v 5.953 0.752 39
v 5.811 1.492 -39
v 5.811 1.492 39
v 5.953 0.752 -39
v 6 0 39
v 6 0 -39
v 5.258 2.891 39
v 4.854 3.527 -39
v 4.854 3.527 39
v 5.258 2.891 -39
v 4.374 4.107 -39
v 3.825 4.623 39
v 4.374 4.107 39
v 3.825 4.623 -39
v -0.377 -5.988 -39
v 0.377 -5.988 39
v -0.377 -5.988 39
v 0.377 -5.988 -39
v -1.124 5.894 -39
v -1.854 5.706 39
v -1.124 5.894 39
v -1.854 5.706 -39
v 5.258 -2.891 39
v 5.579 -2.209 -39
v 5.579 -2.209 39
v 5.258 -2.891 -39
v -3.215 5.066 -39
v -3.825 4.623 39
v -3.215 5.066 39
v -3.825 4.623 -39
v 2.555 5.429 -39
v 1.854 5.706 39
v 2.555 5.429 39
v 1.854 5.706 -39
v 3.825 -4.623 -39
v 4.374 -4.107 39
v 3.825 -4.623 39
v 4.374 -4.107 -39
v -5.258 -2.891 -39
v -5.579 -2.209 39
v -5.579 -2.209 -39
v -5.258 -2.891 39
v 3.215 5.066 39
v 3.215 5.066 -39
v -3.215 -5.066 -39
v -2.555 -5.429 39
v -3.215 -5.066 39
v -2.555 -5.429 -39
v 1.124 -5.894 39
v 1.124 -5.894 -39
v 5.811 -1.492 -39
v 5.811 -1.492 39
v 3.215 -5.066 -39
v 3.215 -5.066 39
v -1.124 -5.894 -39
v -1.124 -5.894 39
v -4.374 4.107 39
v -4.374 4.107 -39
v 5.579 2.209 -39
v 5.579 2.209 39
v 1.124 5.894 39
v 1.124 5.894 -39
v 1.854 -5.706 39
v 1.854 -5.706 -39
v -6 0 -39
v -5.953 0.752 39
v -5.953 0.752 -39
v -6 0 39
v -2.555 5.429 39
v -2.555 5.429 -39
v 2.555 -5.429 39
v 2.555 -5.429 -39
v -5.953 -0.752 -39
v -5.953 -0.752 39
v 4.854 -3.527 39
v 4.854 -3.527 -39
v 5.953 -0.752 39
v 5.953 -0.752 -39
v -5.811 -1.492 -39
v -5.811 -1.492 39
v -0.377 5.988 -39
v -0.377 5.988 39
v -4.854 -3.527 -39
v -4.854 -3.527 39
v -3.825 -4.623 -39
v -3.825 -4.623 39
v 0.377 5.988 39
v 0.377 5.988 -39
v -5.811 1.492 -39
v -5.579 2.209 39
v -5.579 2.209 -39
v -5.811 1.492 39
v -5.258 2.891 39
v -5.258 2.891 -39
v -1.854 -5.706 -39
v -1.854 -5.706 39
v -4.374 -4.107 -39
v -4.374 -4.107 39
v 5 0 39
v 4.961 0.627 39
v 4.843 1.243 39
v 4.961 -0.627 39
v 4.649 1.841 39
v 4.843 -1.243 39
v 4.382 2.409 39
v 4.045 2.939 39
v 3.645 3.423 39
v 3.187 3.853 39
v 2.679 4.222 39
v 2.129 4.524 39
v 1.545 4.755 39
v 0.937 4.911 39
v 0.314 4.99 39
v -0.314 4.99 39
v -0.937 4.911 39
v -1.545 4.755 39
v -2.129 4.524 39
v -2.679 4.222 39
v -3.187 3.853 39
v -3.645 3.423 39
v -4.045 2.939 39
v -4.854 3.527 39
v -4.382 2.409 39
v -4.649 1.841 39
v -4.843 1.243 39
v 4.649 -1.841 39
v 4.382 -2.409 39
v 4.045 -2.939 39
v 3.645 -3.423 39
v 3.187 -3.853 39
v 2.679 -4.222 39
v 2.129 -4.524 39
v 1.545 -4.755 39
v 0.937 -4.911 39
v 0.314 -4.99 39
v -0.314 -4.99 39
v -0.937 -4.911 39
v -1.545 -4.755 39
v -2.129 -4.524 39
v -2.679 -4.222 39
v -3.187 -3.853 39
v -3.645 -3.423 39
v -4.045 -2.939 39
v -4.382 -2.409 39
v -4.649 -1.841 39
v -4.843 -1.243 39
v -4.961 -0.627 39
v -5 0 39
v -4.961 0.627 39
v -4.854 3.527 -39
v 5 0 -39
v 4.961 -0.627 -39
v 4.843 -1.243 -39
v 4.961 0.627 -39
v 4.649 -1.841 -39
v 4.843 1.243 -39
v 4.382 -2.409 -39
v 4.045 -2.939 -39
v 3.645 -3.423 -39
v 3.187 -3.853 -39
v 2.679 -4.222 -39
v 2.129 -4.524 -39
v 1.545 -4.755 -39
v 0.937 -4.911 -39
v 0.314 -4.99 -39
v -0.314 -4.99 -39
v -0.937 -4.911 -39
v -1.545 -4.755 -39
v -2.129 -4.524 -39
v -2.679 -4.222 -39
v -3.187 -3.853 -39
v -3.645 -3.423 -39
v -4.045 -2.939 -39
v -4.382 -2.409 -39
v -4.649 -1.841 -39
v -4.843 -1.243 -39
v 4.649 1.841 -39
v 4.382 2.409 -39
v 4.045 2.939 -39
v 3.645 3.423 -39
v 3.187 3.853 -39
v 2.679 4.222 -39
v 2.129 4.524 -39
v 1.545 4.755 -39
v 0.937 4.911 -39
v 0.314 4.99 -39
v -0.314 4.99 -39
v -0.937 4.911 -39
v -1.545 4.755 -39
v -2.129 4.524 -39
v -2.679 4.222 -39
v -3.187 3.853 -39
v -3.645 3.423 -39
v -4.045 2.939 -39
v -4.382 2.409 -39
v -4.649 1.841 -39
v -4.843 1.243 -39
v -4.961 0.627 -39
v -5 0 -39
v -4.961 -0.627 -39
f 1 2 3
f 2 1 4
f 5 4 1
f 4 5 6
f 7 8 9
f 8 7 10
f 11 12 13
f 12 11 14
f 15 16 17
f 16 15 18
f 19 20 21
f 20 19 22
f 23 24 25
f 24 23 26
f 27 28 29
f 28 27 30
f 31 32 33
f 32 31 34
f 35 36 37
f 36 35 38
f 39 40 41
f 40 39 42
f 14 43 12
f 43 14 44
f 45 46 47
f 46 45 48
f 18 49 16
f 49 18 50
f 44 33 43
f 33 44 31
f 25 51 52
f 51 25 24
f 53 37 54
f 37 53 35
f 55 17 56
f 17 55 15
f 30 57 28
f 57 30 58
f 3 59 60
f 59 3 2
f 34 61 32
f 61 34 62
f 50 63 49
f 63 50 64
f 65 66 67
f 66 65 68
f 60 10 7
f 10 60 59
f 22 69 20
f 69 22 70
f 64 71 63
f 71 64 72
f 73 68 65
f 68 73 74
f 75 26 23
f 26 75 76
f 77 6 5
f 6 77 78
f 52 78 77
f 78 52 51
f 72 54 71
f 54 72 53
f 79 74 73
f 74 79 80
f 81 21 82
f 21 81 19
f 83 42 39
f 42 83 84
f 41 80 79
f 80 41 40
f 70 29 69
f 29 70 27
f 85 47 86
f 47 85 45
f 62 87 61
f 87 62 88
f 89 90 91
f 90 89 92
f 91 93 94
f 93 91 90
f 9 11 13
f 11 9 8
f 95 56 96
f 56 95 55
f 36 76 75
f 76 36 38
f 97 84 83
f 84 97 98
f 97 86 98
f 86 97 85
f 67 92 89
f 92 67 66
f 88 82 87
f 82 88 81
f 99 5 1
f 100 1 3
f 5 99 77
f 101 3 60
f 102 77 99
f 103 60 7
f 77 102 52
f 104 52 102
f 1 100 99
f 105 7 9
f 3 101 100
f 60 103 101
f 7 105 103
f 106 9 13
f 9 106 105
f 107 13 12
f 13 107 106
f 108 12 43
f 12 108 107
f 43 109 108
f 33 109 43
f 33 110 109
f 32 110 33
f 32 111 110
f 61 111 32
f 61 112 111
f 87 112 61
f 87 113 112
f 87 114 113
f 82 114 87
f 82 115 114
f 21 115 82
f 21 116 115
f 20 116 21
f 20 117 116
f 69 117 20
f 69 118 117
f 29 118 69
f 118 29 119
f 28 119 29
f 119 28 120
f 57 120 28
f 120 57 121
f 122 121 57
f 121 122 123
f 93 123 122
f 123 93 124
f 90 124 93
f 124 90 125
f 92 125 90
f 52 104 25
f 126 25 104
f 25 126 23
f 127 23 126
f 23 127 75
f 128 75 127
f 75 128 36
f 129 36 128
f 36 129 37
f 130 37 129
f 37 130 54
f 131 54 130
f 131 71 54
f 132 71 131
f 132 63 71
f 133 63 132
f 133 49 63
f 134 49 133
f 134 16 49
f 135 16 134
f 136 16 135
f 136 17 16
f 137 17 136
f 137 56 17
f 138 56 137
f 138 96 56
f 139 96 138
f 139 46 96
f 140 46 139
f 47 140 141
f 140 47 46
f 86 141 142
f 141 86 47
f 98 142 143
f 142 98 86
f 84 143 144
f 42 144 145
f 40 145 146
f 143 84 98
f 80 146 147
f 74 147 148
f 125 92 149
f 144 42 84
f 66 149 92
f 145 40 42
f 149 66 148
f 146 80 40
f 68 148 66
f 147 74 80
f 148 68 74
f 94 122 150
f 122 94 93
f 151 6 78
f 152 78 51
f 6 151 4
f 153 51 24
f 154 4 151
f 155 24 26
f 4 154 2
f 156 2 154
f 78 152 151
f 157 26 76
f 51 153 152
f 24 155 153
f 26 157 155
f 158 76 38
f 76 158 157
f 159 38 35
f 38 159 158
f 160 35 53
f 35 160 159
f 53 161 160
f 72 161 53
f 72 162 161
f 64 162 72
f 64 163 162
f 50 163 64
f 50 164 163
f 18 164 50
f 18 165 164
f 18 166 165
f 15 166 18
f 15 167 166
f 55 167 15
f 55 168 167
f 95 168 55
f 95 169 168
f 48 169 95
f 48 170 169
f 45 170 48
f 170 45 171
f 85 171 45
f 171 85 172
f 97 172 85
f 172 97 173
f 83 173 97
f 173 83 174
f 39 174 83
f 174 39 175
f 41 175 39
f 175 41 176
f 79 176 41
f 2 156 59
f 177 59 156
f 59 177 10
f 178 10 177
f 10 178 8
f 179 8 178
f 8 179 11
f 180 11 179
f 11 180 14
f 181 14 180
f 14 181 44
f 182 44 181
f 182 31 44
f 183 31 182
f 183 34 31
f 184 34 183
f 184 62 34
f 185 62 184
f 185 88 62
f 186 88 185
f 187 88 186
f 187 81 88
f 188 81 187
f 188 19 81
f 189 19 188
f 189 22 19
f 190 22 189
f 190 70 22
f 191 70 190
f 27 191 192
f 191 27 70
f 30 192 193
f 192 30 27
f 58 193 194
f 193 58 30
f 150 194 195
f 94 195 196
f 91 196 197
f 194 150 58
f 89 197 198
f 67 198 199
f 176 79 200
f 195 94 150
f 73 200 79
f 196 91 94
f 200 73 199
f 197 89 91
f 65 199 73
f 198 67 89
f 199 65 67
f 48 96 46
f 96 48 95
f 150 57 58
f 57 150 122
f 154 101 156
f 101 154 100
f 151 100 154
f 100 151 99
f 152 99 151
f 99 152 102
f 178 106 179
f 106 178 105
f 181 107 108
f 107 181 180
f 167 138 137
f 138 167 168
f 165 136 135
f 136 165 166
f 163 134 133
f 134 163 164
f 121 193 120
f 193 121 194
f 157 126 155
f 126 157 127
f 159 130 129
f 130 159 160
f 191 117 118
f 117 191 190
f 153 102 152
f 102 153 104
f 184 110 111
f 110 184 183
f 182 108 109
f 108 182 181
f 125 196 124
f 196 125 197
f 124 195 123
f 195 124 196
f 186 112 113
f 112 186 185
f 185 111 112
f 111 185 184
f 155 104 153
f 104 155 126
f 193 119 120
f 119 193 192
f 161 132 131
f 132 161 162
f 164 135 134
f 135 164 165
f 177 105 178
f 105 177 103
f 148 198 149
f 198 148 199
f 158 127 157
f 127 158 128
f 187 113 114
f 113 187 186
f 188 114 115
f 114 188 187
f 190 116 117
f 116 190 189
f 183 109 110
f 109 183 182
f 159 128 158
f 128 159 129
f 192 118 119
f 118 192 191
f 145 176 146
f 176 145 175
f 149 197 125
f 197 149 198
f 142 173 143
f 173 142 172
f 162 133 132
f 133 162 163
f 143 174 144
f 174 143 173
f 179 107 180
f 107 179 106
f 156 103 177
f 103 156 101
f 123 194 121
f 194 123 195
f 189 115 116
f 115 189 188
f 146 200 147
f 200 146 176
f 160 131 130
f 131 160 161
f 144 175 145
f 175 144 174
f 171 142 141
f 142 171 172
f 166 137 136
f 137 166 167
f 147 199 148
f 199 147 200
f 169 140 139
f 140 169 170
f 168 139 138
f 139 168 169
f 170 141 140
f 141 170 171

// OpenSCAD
$fn = 50;


difference() {
	union() {
		translate(v = [0, 0, -39.0000000000]) {
			cylinder(h = 78, r = 6.0000000000);
		}
	}
	union() {
		translate(v = [0, 0, -100.0000000000]) {
			cylinder(h = 200, r = 5.0000000000);
		}
	}
}
